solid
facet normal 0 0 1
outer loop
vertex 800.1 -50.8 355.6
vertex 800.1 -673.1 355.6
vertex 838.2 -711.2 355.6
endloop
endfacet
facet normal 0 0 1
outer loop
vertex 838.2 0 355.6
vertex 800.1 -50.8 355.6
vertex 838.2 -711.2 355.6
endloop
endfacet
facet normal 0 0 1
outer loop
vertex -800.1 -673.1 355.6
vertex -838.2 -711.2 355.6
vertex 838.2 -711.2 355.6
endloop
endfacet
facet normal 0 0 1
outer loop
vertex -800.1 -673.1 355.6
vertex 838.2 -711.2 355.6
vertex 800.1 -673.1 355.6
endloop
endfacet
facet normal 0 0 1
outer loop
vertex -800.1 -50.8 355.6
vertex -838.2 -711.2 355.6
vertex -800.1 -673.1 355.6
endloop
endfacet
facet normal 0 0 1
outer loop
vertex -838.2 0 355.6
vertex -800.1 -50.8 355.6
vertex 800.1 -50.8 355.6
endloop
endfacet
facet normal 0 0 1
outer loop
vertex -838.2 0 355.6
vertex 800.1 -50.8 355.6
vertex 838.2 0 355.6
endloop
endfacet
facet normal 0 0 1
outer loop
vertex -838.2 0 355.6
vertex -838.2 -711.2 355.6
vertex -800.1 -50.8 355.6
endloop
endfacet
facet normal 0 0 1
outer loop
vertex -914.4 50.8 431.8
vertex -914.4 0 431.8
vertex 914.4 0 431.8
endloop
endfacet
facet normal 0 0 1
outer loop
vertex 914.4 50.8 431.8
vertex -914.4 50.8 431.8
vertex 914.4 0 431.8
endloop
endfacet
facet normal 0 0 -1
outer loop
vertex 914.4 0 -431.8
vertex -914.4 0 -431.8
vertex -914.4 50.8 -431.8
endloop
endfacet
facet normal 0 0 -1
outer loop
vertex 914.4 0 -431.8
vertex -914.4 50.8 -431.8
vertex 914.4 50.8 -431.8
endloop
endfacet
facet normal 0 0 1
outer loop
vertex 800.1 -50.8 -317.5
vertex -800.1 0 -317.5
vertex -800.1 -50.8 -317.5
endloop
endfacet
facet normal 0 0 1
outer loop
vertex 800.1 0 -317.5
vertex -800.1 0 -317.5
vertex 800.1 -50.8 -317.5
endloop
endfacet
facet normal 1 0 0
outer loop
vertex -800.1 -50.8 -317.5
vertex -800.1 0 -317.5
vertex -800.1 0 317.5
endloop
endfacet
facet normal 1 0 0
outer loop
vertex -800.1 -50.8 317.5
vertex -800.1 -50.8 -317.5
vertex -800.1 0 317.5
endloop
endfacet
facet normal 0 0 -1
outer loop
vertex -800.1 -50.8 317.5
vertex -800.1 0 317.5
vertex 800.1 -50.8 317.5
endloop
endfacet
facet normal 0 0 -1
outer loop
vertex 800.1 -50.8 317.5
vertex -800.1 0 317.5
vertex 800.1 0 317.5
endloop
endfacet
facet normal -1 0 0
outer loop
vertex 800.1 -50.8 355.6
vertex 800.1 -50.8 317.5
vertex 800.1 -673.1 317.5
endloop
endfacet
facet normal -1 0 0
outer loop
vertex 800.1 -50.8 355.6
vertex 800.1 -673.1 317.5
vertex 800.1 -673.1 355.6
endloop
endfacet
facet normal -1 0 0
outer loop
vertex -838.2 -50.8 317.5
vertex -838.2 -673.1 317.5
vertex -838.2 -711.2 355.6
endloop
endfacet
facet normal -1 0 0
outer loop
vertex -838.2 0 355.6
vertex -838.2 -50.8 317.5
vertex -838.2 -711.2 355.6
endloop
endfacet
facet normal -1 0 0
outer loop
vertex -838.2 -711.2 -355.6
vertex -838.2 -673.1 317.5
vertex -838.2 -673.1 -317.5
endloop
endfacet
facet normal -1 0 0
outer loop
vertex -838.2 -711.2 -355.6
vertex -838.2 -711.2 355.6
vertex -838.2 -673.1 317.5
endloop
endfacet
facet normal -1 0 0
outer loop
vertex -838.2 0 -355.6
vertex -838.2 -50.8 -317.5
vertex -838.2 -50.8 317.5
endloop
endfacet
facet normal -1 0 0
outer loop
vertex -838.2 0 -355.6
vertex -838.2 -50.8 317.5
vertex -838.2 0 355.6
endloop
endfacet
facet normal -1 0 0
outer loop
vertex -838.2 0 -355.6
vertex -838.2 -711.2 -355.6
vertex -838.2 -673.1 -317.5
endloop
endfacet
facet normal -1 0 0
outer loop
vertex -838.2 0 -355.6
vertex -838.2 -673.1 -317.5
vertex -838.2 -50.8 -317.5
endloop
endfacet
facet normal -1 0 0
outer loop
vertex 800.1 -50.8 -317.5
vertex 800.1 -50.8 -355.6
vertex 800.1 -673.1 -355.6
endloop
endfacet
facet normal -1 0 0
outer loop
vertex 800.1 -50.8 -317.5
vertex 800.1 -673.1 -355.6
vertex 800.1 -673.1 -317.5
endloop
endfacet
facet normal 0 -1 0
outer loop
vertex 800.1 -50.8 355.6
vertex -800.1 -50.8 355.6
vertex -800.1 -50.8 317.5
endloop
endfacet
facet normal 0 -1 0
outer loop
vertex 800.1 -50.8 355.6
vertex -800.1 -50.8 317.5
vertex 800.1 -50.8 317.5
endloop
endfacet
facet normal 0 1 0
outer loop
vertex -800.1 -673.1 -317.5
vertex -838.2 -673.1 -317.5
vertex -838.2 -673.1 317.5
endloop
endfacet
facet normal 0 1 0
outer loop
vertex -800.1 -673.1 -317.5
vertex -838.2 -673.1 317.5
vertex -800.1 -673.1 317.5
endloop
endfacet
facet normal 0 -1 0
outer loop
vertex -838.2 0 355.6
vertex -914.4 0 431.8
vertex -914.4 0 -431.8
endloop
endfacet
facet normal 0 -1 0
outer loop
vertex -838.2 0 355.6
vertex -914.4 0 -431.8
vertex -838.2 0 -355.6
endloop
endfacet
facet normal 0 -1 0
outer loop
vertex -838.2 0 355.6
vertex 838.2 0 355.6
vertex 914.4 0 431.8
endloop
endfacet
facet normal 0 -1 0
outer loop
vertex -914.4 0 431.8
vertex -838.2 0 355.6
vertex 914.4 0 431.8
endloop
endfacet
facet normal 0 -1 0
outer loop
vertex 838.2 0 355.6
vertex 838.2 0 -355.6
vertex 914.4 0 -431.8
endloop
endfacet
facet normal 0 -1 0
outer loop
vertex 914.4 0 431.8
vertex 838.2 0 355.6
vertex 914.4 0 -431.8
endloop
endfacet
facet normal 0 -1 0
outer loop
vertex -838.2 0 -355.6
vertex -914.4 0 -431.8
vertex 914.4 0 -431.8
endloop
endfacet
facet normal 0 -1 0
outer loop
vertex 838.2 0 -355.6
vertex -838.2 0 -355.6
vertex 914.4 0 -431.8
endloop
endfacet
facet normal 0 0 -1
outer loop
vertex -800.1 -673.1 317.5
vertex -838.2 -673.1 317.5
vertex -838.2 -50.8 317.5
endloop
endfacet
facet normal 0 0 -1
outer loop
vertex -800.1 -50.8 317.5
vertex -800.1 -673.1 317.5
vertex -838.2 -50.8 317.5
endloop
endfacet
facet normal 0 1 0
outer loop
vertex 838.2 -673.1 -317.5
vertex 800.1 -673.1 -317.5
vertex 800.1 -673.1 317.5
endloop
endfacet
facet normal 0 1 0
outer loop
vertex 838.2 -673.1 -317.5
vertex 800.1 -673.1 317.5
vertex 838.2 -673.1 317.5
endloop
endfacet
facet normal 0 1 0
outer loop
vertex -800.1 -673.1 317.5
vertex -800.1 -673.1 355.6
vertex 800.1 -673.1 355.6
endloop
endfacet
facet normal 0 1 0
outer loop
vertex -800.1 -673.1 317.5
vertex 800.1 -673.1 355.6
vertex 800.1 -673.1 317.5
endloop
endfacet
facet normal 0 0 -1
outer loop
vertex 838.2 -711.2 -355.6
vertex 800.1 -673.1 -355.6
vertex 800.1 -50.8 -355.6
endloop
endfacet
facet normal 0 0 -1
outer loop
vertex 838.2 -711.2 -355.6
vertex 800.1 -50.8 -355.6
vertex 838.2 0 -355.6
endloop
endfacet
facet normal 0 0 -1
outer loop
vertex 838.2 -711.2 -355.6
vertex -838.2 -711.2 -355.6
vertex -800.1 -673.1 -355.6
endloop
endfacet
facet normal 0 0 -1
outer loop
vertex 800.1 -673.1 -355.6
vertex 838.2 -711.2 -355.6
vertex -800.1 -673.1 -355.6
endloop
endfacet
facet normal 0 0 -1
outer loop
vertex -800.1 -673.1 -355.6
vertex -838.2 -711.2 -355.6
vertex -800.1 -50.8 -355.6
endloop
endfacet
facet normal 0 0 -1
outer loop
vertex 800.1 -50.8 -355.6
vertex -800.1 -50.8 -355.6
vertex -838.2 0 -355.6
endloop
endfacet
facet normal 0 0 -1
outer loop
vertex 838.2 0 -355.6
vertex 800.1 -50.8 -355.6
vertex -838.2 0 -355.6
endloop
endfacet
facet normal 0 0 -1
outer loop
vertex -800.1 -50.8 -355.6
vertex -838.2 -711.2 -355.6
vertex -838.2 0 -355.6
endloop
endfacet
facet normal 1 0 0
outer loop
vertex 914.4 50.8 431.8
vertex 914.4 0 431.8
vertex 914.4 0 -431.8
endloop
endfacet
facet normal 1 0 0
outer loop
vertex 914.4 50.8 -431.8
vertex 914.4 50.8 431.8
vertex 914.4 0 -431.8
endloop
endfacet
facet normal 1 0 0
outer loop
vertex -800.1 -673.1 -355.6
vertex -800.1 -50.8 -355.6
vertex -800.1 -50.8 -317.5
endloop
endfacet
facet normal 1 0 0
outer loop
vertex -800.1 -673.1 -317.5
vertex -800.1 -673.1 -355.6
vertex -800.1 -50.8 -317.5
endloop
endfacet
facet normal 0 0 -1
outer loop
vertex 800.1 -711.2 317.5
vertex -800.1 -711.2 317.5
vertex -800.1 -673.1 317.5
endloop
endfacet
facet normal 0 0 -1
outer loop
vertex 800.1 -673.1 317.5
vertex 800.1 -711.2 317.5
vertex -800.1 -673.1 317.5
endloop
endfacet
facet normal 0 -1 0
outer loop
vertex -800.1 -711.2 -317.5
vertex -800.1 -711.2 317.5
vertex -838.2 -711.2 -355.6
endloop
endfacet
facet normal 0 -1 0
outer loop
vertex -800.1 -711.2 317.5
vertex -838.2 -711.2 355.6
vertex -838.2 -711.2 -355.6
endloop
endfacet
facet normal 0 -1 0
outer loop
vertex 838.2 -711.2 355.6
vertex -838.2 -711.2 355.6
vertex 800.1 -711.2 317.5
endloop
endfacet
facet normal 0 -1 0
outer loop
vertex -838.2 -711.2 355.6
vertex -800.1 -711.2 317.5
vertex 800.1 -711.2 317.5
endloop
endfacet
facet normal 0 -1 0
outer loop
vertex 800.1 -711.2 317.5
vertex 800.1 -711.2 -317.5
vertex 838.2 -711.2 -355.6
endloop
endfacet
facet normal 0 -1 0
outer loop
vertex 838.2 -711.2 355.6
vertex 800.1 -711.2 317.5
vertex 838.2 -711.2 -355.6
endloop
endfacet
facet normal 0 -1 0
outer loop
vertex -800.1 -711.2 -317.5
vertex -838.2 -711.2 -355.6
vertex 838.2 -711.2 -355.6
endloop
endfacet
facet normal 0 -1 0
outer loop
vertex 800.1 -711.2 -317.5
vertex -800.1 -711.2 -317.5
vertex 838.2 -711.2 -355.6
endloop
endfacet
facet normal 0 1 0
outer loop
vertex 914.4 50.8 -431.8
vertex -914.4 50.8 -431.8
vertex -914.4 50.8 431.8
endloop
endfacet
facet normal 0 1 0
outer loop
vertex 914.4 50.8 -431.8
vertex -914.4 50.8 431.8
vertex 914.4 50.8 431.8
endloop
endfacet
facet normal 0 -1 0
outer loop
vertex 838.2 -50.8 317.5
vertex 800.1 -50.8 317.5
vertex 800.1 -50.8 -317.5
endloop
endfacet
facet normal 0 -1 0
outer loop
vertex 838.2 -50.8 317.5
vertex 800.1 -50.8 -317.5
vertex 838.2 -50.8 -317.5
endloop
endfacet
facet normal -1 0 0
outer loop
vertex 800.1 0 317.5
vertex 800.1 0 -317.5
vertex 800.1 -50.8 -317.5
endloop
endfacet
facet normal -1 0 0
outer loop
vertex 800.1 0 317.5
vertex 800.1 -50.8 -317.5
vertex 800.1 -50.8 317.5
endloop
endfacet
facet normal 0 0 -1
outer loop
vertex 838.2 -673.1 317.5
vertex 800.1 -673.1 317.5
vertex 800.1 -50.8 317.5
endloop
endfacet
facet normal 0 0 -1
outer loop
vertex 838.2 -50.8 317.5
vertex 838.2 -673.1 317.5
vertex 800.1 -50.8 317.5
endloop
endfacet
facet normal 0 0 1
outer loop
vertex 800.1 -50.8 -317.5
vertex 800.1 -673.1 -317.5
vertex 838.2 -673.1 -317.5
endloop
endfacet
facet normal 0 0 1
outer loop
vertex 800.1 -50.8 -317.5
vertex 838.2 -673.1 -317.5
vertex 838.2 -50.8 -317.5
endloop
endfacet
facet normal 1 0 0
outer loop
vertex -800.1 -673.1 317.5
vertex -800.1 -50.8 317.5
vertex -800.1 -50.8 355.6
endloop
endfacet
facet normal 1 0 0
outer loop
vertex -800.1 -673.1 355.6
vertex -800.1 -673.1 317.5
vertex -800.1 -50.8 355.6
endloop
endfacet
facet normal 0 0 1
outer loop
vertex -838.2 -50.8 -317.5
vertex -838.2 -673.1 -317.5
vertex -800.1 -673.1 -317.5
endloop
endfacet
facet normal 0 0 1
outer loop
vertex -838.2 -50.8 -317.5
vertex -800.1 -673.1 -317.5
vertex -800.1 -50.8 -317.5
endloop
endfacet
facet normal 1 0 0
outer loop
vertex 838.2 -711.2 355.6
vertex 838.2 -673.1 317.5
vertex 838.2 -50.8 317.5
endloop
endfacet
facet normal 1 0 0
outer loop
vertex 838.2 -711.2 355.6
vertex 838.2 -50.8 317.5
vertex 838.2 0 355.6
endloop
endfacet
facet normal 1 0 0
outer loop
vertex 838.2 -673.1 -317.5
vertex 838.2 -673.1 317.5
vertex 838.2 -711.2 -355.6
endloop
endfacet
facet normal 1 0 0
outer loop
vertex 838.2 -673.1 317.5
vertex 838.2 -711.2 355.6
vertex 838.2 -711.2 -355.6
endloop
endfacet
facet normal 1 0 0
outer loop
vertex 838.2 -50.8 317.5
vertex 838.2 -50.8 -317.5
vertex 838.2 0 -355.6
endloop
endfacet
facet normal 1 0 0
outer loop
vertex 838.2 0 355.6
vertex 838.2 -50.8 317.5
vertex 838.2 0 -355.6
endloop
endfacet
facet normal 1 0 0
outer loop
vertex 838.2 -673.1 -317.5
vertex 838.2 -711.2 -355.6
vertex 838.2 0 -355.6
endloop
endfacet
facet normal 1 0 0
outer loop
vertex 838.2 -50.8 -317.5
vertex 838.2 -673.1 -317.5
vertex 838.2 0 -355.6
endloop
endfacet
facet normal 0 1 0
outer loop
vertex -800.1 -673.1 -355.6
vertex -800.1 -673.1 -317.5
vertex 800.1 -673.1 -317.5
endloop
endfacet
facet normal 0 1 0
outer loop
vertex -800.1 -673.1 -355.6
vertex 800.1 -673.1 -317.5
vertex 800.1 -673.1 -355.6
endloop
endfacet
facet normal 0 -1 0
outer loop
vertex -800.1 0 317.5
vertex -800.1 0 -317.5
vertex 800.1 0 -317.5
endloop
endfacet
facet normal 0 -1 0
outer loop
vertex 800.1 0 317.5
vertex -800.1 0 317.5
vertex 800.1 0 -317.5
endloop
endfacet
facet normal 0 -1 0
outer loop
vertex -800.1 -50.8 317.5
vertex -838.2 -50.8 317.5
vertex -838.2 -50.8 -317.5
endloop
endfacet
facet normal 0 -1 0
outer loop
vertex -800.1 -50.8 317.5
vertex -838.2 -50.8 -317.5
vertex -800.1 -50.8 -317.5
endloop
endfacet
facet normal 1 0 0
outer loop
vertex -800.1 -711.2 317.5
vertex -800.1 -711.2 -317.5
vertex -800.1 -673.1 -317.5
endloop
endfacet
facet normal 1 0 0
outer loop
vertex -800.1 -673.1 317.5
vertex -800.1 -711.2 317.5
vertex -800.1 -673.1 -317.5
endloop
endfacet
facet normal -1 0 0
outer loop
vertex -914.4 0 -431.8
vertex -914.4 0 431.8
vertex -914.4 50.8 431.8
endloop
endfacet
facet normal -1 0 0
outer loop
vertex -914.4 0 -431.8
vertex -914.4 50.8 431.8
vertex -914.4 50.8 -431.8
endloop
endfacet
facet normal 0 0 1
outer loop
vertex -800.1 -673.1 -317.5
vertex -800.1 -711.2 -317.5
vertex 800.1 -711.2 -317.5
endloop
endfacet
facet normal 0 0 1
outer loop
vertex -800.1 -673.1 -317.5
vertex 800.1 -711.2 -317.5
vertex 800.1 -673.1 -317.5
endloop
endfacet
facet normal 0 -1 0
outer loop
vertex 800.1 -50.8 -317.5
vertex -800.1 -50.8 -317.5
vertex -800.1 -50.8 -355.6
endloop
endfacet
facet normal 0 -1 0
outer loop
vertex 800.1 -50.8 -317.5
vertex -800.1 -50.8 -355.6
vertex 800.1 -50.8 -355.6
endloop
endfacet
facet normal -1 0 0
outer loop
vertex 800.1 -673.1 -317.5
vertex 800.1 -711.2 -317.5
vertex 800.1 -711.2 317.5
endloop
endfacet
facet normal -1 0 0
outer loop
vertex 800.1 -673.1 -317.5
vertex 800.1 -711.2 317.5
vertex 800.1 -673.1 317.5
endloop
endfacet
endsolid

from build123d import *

# Parameters (mm, degrees)
SKETCH1_W           = 1828.8
SKETCH1_H           = 863.6
BOSS_EXTRUDE1_DEPTH = 50.8
SKETCH2_W           = 1676.4
SKETCH2_H           = 711.2
SKETCH2_W_2         = 1600.2
SKETCH2_H_2         = 635
BOSS_EXTRUDE2_DEPTH = 50.8
SKETCH3_W           = 38.1
SKETCH3_H           = 38.1
BOSS_EXTRUDE3_DEPTH = 660.4
BOSS_EXTRUDE4_REACH = 1907.72
SKETCH4_W           = 38.1
SKETCH4_H           = 38.1
BOSS_EXTRUDE5_REACH = 1381.632
SKETCH5_W           = 38.1
SKETCH5_H           = 38.1


with BuildPart() as part:
    # Sketch1 → Boss-Extrude1 (new body)
    with BuildSketch(Plane(origin=(0, 0, 0), x_dir=(1, 0, 0), z_dir=(0, 1, 0))):
        Rectangle(SKETCH1_W, SKETCH1_H)
    extrude(amount=BOSS_EXTRUDE1_DEPTH)

    # Sketch2 → Boss-Extrude2 (add)
    with BuildSketch(Plane.XZ):
        Rectangle(SKETCH2_W, SKETCH2_H)
        Rectangle(SKETCH2_W_2, SKETCH2_H_2, mode=Mode.SUBTRACT)
    extrude(amount=BOSS_EXTRUDE2_DEPTH)

    # Sketch3 → Boss-Extrude3 (add)
    with BuildSketch(Plane.XZ.offset(50.8)):
        with Locations((-819.15, 336.55)):
            Rectangle(SKETCH3_W, SKETCH3_H)
        with Locations((819.15, 336.55)):
            Rectangle(SKETCH3_W, SKETCH3_H)
        with Locations((819.15, -336.55)):
            Rectangle(SKETCH3_W, SKETCH3_H)
        with Locations((-819.15, -336.55)):
            Rectangle(SKETCH3_W, SKETCH3_H)
    extrude(amount=BOSS_EXTRUDE3_DEPTH)

    # Sketch4 → Boss-Extrude4 (add, up to next)
    with BuildSketch(Plane(origin=(-800.1, 0, 0), x_dir=(0, 0, -1), z_dir=(1, 0, 0)), mode=Mode.PRIVATE) as boss_extrude4_sk1:
        with Locations((-336.55, -692.15)):
            Rectangle(SKETCH4_W, SKETCH4_H)
    boss_extrude4_tool1 = extrude(boss_extrude4_sk1.sketch, amount=BOSS_EXTRUDE4_REACH, mode=Mode.PRIVATE) - part.part
    # Sketch4 → Boss-Extrude4 (add, up to next)
    with BuildSketch(Plane(origin=(-800.1, 0, 0), x_dir=(0, 0, -1), z_dir=(1, 0, 0)), mode=Mode.PRIVATE) as boss_extrude4_sk2:
        with Locations((336.55, -692.15)):
            Rectangle(SKETCH4_W, SKETCH4_H)
    boss_extrude4_tool2 = extrude(boss_extrude4_sk2.sketch, amount=BOSS_EXTRUDE4_REACH, mode=Mode.PRIVATE) - part.part
    add(boss_extrude4_tool1.solids().sort_by_distance((-800.1, -692.15, 336.55))[0])
    add(boss_extrude4_tool2.solids().sort_by_distance((-800.1, -692.15, -336.55))[0])

    # Sketch5 → Boss-Extrude5 (add, up to next)
    with BuildSketch(Plane.XY.offset(-317.5), mode=Mode.PRIVATE) as boss_extrude5_sk1:
        with Locations((-819.15, -692.15)):
            Rectangle(SKETCH5_W, SKETCH5_H)
    boss_extrude5_tool1 = extrude(boss_extrude5_sk1.sketch, amount=BOSS_EXTRUDE5_REACH, mode=Mode.PRIVATE) - part.part
    # Sketch5 → Boss-Extrude5 (add, up to next)
    with BuildSketch(Plane.XY.offset(-317.5), mode=Mode.PRIVATE) as boss_extrude5_sk2:
        with Locations((819.15, -692.15)):
            Rectangle(SKETCH5_W, SKETCH5_H)
    boss_extrude5_tool2 = extrude(boss_extrude5_sk2.sketch, amount=BOSS_EXTRUDE5_REACH, mode=Mode.PRIVATE) - part.part
    add(boss_extrude5_tool1.solids().sort_by_distance((-819.15, -692.15, -317.5))[0])
    add(boss_extrude5_tool2.solids().sort_by_distance((819.15, -692.15, -317.5))[0])


solid = part.part
